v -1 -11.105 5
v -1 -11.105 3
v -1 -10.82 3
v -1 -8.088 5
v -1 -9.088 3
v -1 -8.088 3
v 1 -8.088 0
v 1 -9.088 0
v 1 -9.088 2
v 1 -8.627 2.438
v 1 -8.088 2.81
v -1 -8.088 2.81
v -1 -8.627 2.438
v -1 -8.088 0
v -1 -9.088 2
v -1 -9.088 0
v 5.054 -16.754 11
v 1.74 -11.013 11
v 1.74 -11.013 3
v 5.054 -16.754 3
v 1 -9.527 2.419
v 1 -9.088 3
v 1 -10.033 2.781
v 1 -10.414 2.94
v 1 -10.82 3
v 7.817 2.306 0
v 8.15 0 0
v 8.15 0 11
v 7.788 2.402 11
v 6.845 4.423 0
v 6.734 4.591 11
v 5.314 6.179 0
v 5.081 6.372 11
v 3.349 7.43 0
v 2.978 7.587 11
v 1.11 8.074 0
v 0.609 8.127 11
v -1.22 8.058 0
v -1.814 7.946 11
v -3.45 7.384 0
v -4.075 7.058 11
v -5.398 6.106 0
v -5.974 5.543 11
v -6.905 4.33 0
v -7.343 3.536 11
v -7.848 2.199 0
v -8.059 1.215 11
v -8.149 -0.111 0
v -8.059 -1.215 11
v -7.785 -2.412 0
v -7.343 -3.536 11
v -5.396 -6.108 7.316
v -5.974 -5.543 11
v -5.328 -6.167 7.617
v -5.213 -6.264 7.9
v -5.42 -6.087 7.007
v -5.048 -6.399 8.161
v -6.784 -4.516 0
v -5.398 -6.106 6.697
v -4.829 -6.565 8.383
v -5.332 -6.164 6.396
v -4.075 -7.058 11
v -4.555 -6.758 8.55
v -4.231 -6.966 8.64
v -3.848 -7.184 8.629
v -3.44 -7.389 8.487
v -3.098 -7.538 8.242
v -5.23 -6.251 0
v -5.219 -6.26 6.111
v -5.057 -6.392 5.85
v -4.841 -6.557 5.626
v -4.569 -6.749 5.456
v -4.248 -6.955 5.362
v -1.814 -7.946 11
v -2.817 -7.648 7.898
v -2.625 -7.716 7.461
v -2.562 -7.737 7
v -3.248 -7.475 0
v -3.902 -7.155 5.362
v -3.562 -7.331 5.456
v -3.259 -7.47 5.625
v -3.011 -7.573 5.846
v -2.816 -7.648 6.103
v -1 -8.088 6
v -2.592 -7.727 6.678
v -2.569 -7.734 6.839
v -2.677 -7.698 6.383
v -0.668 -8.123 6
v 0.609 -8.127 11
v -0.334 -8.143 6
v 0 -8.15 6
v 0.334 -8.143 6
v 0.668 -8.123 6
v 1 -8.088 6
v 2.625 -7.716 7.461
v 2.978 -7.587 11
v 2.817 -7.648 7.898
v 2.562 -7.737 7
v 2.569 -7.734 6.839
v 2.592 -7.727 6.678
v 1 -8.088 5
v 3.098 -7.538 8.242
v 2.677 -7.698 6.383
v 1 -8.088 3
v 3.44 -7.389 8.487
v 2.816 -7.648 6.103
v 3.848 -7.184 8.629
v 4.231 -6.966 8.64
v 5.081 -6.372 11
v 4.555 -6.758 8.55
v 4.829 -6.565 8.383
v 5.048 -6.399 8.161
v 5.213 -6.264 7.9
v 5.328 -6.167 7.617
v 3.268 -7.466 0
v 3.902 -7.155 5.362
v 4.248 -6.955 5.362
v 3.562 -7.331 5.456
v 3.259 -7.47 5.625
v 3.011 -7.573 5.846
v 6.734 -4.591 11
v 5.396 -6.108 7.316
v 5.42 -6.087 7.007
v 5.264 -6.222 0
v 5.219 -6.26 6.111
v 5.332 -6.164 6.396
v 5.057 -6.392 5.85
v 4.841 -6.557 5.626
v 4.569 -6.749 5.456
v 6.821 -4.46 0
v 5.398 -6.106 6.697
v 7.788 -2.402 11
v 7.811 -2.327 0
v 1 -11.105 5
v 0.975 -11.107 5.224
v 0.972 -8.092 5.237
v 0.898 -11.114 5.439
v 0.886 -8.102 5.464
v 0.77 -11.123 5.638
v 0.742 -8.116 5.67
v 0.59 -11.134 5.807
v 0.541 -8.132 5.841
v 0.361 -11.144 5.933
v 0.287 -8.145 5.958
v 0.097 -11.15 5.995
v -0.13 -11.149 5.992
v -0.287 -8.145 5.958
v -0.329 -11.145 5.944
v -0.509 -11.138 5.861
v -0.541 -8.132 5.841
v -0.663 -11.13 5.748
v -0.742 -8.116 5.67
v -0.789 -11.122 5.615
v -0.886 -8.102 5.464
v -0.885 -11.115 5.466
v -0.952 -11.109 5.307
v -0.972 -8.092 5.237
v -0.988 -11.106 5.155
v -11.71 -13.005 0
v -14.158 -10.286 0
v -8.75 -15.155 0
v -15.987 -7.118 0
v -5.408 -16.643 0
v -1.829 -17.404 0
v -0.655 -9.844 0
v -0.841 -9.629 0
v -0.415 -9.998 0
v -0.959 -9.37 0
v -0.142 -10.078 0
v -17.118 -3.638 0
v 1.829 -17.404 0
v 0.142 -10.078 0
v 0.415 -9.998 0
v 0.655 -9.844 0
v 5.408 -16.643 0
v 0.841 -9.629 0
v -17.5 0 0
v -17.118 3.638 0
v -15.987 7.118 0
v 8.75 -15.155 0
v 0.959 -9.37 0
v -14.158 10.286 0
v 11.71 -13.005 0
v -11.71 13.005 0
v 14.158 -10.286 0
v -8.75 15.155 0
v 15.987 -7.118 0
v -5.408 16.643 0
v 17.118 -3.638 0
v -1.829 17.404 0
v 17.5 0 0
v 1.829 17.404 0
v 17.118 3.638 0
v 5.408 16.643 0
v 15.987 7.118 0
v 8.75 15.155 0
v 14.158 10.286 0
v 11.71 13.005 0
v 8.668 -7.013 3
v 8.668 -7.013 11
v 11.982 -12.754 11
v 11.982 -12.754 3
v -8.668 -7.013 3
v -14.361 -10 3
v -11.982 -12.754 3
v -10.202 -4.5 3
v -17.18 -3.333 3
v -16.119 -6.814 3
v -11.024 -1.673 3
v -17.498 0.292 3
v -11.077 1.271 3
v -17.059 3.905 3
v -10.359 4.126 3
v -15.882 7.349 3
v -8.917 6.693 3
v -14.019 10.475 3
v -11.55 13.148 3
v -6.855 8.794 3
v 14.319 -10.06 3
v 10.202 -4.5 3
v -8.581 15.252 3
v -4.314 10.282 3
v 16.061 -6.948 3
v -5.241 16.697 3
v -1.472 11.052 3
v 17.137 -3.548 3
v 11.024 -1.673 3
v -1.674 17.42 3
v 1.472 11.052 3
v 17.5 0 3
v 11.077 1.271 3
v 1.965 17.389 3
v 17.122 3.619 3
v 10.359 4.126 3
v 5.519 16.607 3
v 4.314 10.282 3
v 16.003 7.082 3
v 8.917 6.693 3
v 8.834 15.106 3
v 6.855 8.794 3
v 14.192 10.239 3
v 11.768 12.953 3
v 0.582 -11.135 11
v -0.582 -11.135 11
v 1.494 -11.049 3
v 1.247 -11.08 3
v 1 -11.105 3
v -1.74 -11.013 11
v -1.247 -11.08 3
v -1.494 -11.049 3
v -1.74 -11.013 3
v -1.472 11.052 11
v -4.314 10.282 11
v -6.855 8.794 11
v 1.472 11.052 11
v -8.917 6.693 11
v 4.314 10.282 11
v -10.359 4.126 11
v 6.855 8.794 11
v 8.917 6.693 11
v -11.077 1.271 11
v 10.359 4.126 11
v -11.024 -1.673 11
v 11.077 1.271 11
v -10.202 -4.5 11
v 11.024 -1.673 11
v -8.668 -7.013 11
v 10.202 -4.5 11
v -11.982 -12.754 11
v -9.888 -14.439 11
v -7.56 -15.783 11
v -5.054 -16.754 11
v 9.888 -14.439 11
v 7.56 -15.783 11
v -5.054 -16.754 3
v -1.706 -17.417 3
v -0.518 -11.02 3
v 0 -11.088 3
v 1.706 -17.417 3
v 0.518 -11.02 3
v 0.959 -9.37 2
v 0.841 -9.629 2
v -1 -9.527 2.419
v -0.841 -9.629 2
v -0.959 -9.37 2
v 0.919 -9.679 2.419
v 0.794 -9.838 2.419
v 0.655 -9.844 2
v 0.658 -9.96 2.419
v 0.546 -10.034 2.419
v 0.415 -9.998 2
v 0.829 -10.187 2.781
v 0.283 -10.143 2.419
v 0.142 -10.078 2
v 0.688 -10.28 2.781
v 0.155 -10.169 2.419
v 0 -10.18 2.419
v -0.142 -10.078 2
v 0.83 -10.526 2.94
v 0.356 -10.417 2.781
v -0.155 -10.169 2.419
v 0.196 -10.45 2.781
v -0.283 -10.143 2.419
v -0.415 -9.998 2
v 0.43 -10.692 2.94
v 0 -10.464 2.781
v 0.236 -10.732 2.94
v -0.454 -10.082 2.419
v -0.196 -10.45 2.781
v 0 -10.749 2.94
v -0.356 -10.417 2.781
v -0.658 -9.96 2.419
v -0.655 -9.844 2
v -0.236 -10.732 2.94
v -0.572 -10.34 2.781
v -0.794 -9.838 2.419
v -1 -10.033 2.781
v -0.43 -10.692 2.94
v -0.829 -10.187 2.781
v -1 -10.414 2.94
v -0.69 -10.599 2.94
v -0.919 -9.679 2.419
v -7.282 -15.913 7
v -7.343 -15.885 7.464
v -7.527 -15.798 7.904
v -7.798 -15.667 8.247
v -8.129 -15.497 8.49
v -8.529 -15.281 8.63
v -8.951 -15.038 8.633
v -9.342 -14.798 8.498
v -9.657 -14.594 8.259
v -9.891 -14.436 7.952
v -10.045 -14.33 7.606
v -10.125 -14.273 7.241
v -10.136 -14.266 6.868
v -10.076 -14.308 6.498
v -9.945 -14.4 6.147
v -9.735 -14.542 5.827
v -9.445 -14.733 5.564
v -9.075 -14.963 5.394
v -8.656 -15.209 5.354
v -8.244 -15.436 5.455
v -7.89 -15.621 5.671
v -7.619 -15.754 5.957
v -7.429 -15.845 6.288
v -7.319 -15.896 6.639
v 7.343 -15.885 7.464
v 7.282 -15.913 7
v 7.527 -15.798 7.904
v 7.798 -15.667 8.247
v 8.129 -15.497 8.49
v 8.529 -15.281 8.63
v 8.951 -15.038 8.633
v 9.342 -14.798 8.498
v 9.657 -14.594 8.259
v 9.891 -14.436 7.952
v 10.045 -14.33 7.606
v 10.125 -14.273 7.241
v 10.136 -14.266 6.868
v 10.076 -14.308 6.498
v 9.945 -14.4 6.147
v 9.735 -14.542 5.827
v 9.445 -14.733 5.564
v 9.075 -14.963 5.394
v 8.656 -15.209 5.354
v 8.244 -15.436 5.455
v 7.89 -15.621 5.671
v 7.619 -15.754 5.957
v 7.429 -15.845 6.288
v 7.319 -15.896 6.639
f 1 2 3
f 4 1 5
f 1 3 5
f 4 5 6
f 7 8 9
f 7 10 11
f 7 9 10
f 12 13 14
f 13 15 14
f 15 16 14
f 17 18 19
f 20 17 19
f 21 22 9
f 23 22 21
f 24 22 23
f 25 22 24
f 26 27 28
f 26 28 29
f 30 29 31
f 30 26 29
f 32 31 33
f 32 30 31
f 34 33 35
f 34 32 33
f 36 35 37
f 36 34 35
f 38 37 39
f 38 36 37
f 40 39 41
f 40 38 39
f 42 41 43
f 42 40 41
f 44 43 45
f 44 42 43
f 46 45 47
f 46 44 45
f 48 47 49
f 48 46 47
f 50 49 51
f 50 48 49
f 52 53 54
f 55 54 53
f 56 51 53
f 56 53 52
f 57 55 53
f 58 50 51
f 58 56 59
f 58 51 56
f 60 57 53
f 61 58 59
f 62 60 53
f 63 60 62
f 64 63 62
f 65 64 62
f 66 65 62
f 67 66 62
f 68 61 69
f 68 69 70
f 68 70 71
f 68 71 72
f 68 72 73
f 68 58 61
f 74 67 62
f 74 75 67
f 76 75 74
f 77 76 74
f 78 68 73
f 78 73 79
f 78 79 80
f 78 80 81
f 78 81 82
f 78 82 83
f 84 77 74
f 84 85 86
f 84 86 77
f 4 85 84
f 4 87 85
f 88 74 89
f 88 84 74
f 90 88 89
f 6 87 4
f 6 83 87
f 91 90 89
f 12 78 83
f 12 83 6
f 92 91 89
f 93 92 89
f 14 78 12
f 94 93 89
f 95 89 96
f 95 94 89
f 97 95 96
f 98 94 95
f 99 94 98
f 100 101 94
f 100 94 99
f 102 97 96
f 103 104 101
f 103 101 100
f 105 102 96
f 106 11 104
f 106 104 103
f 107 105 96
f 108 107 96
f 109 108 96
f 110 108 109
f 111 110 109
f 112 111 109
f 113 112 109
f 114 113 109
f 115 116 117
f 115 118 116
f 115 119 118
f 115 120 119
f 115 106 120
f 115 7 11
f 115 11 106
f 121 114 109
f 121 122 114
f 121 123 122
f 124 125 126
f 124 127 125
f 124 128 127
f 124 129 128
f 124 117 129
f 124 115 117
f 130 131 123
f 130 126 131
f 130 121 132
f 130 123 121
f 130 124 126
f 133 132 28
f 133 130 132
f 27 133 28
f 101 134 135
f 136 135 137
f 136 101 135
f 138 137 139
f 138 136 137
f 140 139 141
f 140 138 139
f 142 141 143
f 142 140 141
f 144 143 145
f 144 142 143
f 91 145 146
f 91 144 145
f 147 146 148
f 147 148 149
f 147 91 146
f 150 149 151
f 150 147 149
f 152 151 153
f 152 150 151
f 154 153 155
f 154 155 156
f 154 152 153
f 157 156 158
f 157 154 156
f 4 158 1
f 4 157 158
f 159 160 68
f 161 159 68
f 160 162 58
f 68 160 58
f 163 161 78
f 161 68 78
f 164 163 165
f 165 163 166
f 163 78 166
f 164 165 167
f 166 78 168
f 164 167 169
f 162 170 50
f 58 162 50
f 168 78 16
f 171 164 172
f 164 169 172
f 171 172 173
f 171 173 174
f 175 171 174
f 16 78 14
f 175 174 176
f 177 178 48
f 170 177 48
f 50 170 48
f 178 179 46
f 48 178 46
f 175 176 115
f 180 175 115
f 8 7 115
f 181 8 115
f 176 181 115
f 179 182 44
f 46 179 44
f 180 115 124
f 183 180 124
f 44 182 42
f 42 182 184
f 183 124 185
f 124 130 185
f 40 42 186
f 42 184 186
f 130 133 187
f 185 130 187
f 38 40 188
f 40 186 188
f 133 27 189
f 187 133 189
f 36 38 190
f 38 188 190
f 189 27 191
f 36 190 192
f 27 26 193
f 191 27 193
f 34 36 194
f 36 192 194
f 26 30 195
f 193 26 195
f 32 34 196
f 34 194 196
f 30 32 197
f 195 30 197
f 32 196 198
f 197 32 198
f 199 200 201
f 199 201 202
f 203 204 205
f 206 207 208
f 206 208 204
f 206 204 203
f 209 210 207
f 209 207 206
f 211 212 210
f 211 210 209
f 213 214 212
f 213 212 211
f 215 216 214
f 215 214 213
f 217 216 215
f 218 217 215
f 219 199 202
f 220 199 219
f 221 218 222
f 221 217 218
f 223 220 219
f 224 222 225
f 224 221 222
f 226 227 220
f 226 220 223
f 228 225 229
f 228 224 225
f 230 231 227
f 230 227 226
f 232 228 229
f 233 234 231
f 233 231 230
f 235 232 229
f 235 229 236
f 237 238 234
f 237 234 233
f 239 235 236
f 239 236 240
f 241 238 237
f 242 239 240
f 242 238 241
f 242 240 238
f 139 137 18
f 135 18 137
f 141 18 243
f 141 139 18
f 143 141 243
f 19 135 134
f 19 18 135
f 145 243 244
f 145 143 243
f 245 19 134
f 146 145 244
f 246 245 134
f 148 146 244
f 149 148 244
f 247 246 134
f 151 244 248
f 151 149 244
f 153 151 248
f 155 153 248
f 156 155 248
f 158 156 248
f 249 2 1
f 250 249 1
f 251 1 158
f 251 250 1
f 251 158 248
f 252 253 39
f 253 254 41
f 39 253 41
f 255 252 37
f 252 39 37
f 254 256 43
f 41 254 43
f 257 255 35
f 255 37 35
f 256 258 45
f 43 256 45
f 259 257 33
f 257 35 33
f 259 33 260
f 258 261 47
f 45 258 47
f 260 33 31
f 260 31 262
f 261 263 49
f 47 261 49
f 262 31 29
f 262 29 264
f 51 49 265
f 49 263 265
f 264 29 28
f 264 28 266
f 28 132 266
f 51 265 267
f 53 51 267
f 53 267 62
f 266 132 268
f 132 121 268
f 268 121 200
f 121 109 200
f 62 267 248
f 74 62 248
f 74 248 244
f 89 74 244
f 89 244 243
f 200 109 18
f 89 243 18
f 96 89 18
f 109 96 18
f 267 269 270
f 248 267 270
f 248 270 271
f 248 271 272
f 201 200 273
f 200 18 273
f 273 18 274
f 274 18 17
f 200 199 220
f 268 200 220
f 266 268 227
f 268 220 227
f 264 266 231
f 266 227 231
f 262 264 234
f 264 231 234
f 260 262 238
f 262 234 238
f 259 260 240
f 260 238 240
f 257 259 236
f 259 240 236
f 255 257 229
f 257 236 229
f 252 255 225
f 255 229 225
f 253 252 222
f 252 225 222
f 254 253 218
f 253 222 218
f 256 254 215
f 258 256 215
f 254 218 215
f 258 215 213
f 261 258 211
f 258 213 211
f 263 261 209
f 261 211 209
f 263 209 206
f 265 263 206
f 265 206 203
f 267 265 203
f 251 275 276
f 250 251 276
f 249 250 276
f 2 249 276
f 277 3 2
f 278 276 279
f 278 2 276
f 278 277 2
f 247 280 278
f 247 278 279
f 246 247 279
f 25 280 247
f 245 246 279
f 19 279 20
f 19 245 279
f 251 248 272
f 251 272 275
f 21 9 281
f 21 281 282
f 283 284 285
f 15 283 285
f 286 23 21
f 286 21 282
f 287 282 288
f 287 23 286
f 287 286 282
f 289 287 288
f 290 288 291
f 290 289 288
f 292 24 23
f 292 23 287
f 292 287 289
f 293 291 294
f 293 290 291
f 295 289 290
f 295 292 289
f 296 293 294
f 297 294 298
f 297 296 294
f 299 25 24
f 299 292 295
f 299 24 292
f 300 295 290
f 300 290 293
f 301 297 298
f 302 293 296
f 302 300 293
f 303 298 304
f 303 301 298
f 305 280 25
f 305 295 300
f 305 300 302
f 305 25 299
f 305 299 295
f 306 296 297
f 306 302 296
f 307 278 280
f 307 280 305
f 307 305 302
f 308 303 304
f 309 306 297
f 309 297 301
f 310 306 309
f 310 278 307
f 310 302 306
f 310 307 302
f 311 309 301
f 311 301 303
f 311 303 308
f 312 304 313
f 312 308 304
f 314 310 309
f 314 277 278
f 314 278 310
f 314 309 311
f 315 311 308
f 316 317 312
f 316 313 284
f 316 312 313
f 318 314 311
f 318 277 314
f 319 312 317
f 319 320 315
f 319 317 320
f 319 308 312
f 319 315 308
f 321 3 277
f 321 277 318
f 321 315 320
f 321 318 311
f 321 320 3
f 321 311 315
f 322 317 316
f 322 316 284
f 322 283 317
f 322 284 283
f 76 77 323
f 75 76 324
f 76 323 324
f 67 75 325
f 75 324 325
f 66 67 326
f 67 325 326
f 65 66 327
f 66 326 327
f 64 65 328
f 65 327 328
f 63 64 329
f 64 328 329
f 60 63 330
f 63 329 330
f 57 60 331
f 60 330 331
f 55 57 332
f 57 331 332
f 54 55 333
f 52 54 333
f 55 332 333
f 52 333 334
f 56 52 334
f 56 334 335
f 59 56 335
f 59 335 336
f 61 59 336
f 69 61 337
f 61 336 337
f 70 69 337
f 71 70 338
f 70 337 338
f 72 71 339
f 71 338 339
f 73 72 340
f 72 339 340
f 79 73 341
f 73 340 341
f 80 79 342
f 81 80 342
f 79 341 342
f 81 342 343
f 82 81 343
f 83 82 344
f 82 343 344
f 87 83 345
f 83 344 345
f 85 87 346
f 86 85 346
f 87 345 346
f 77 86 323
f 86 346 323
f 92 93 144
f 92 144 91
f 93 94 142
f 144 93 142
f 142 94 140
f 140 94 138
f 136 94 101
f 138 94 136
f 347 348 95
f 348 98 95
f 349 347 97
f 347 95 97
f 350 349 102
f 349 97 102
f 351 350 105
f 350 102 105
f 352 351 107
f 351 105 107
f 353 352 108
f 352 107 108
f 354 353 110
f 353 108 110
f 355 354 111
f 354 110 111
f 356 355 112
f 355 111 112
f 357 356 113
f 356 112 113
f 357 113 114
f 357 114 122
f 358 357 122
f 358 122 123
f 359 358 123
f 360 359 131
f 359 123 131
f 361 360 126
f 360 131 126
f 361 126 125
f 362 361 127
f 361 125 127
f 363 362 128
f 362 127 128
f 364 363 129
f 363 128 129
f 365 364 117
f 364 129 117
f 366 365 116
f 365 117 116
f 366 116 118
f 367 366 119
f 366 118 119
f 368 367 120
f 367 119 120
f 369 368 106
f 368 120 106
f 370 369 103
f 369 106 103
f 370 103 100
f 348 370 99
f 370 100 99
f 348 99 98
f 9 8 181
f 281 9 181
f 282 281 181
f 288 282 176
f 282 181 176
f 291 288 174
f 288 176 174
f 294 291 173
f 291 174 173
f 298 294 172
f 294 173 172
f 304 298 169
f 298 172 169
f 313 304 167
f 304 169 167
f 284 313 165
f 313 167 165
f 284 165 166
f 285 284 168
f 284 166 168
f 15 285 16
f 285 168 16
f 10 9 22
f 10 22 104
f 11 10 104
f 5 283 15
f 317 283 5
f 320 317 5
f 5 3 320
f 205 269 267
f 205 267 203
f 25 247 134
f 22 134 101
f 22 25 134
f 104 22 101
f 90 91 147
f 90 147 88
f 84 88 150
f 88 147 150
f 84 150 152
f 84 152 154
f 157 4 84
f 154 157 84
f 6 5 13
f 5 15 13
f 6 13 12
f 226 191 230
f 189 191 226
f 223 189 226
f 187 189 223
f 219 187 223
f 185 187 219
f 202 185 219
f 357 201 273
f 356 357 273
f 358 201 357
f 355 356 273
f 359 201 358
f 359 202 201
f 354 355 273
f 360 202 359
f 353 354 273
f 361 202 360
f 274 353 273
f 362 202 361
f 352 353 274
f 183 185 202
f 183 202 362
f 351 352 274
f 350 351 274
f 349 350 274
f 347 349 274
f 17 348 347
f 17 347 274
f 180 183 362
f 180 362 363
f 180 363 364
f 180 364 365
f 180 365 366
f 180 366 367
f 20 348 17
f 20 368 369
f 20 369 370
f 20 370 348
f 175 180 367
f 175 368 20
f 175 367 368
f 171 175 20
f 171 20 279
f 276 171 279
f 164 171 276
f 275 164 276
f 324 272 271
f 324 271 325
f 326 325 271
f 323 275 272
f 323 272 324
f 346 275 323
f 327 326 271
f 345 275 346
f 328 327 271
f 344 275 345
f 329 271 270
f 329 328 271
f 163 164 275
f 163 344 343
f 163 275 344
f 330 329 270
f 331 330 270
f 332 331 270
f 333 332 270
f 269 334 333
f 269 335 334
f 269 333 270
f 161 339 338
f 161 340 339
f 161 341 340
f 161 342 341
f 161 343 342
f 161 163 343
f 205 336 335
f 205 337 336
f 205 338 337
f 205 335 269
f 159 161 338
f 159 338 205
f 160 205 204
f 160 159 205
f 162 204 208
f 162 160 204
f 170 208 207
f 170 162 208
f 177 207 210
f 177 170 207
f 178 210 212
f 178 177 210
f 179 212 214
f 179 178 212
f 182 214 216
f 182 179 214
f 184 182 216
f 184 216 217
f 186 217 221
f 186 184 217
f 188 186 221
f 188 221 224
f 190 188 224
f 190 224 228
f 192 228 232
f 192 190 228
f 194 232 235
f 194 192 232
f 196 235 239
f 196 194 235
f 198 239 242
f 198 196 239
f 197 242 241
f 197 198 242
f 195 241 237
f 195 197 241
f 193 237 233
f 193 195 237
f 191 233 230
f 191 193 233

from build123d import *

# Parameters (mm, degrees)
SKETCH1_R                            = 17.5
SKETCH1_R_2                          = 8.15
BOSS_EXTRUDE1_DEPTH                  = 3
SKETCH2_R                            = 11.15
SKETCH2_R_2                          = 8.15
BOSS_EXTRUDE2_DEPTH                  = 8
BOSS_EXTRUDE5_REACH                  = 39.295
BOSS_EXTRUDE5_END_RADIUS             = 17.5
SKETCH4_W                            = 8
SKETCH4_H                            = 8
BOSS_EXTRUDE5_DIRECTION_2_REACH      = 39.295
BOSS_EXTRUDE5_DIRECTION_2_END_RADIUS = 11.15
CUT_EXTRUDE1_REACH                   = 39.295
CUT_EXTRUDE1_END_RADIUS              = 8.15
SKETCH3_R                            = 1.65
CUT_EXTRUDE1_DIRECTION_2_REACH       = 39.295
CUT_EXTRUDE1_DIRECTION_2_END_RADIUS  = 17.5
CUT_EXTRUDE2_DEPTH                   = 3
CUT_EXTRUDE2_DEPTH_BACK              = 27.009613773
SKETCH6_W                            = 2
SKETCH6_H                            = 9.382987565
CUT_EXTRUDE3_DEPTH                   = 3
FILLET2_R                            = 1


with BuildPart() as part:
    # Sketch1 → Boss-Extrude1 (new body)
    with BuildSketch(Plane.XY):
        Circle(SKETCH1_R)
        Circle(SKETCH1_R_2, mode=Mode.SUBTRACT)
    extrude(amount=BOSS_EXTRUDE1_DEPTH)

    # Sketch2 → Boss-Extrude2 (add)
    with BuildSketch(Plane.XY.offset(3)):
        Circle(SKETCH2_R)
        Circle(SKETCH2_R_2, mode=Mode.SUBTRACT)
    extrude(amount=BOSS_EXTRUDE2_DEPTH)

    # Boss-Extrude5: up to this cylinder (the profile starts inside it)
    boss_extrude5_end = Plane(origin=(0, 0, 7), z_dir=(0, 0, -1)) * Cylinder(BOSS_EXTRUDE5_END_RADIUS, 114.59, mode=Mode.PRIVATE)
    # Sketch4 → Boss-Extrude5 (add, up to the surface)
    with BuildSketch(Plane(origin=(-5.575, -9.656183252, 0), x_dir=(0, 0, -1), z_dir=(-0.500000000000001, -0.866025403784438, 0)), mode=Mode.PRIVATE) as boss_extrude5_sk1:
        with Locations((-7, 0)):
            Rectangle(SKETCH4_W, SKETCH4_H)
    boss_extrude5_tool1 = extrude(boss_extrude5_sk1.sketch, amount=BOSS_EXTRUDE5_REACH, mode=Mode.PRIVATE) & boss_extrude5_end
    boss_extrude5 = boss_extrude5_tool1.solids().sort_by_distance((-5.575, -9.656183, 7))[0]
    add(boss_extrude5)

    # Boss-Extrude5 direction 2: up to this cylinder (the profile starts outside it)
    boss_extrude5_direction_2_end = Plane(origin=(0, 0, 7), z_dir=(0, 0, -1)) * Cylinder(BOSS_EXTRUDE5_DIRECTION_2_END_RADIUS, 101.89, mode=Mode.PRIVATE)
    # Sketch4 → Boss-Extrude5 direction 2 (add, up to the surface)
    with BuildSketch(Plane(origin=(-5.575, -9.656183252, 0), x_dir=(0, 0, -1), z_dir=(-0.500000000000001, -0.866025403784438, 0)), mode=Mode.PRIVATE) as boss_extrude5_direction_2_sk1:
        with Locations((-7, 0)):
            Rectangle(SKETCH4_W, SKETCH4_H)
    boss_extrude5_direction_2_tool1 = extrude(boss_extrude5_direction_2_sk1.sketch, amount=-BOSS_EXTRUDE5_DIRECTION_2_REACH, mode=Mode.PRIVATE) - boss_extrude5_direction_2_end
    boss_extrude5_direction_2 = boss_extrude5_direction_2_tool1.solids().sort_by_distance((-5.575, -9.656183, 7))[0] + boss_extrude5_direction_2_tool1.solids().sort_by_distance((-5.575, -9.656183, 7))[1]
    add(boss_extrude5_direction_2)
    boss_extrude5 = boss_extrude5 + boss_extrude5_direction_2  # both directions under the feature's name, for the pattern or mirror that repeats it

    # Cut-Extrude1: up to this cylinder (the profile starts outside it)
    cut_extrude1_end = Plane(origin=(0, 0, 7), z_dir=(0, 0, -1)) * Cylinder(CUT_EXTRUDE1_END_RADIUS, 95.89, mode=Mode.PRIVATE)
    # Sketch3 → Cut-Extrude1 (cut, up to the surface)
    with BuildSketch(Plane(origin=(-5.575, -9.656183252, 0), x_dir=(0, 0, -1), z_dir=(-0.500000000000001, -0.866025403784438, 0)), mode=Mode.PRIVATE) as cut_extrude1_sk1:
        with Locations(Location((-7, 0, 0), (0, 0, 90))):
            Circle(SKETCH3_R)
    cut_extrude1_tool1 = extrude(cut_extrude1_sk1.sketch, amount=-CUT_EXTRUDE1_REACH, mode=Mode.PRIVATE) - cut_extrude1_end
    cut_extrude1 = cut_extrude1_tool1.solids().sort_by_distance((-5.575, -9.656183, 7))[0]
    add(cut_extrude1, mode=Mode.SUBTRACT)

    # Cut-Extrude1 direction 2: up to this cylinder (the profile starts inside it)
    cut_extrude1_direction_2_end = Plane(origin=(0, 0, 7), z_dir=(0, 0, -1)) * Cylinder(CUT_EXTRUDE1_DIRECTION_2_END_RADIUS, 114.59, mode=Mode.PRIVATE)
    # Sketch3 → Cut-Extrude1 direction 2 (cut, up to the surface)
    with BuildSketch(Plane(origin=(-5.575, -9.656183252, 0), x_dir=(0, 0, -1), z_dir=(-0.500000000000001, -0.866025403784438, 0)), mode=Mode.PRIVATE) as cut_extrude1_direction_2_sk1:
        with Locations(Location((-7, 0, 0), (0, 0, 90))):
            Circle(SKETCH3_R)
    cut_extrude1_direction_2_tool1 = extrude(cut_extrude1_direction_2_sk1.sketch, amount=CUT_EXTRUDE1_DIRECTION_2_REACH, mode=Mode.PRIVATE) & cut_extrude1_direction_2_end
    cut_extrude1_direction_2 = cut_extrude1_direction_2_tool1.solids().sort_by_distance((-5.575, -9.656183, 7))[0]
    add(cut_extrude1_direction_2, mode=Mode.SUBTRACT)
    cut_extrude1 = cut_extrude1 + cut_extrude1_direction_2  # both directions under the feature's name, for the pattern or mirror that repeats it

    # Mirror1: Boss-Extrude5, Cut-Extrude1 across plane
    add(boss_extrude5.mirror(Plane(origin=(0, 0, 0), x_dir=(0, 0, 1), z_dir=(1, 0, 0))))
    add(cut_extrude1.mirror(Plane(origin=(0, 0, 0), x_dir=(0, 0, 1), z_dir=(1, 0, 0))), mode=Mode.SUBTRACT)

    # Sketch5 → Cut-Extrude2 (cut, two sides: drawn at the far end of the back side and taken through both)
    with BuildSketch(Plane.XY.offset(3).offset(-CUT_EXTRUDE2_DEPTH_BACK)):
        with BuildLine():
            Line((-1, -9.088417645), (-1, -8.088417645))
            Line((-1, -8.088417645), (1, -8.088417645))
            Line((1, -8.088417645), (1, -9.088417645))
            ThreePointArc((1, -9.088417645), (0, -10.088417645), (-1, -9.088417645))
        make_face()
    extrude(amount=CUT_EXTRUDE2_DEPTH + CUT_EXTRUDE2_DEPTH_BACK, mode=Mode.SUBTRACT)

    # Sketch6 → Cut-Extrude3 (cut)
    with BuildSketch(Plane.XY.offset(3)):
        with Locations((0, -12.779911428)):
            Rectangle(SKETCH6_W, SKETCH6_H)
    extrude(amount=CUT_EXTRUDE3_DEPTH, mode=Mode.SUBTRACT)

    # Fillet2
    # the kernel refuses this fillet: 1 mm, written as the material it adds along each edge
    with BuildSketch(Plane(origin=(1, -9.088417645, 6), x_dir=(0, 0, -1), z_dir=(0, -1, 0))) as fillet2_piece_1_section:
        with BuildLine():
            CenterArc((FILLET2_R, -FILLET2_R), FILLET2_R, 90, 90)
            Line((0, -FILLET2_R), (0, 0))
            Line((0, 0), (FILLET2_R, 0))
        make_face()
    fillet2_piece_1 = extrude(amount=4.516648766, mode=Mode.PRIVATE)
    fillet2_piece_1 = fillet2_piece_1 & Plane(origin=(0, 0, 5.777290132), x_dir=(1, 0, 0), z_dir=(0, 0, -1)) * Cylinder(11.15, 14, mode=Mode.PRIVATE)
    add(fillet2_piece_1)
    with BuildSketch(Plane(origin=(-1, -13.605066411, 6), x_dir=(1, 0, 0), z_dir=(0, 1, 0))) as fillet2_piece_2_section:
        with BuildLine():
            CenterArc((FILLET2_R, FILLET2_R), FILLET2_R, 180, 90)
            Line((0, FILLET2_R), (0, 0))
            Line((0, 0), (FILLET2_R, 0))
        make_face()
    fillet2_piece_2 = extrude(amount=4.516648766, mode=Mode.PRIVATE)
    fillet2_piece_2 = fillet2_piece_2 & Plane(origin=(0, 0, 5.777290055), x_dir=(1, 0, 0), z_dir=(0, 0, -1)) * Cylinder(11.15, 14, mode=Mode.PRIVATE)
    add(fillet2_piece_2)
    with BuildSketch(Plane(origin=(-1, -9.088417645, 6), x_dir=(1, 0, 0), z_dir=(0, 1, 0))) as fillet2_piece_3_section:
        with BuildLine():
            CenterArc((FILLET2_R, FILLET2_R), FILLET2_R, 180, 90)
            Line((0, FILLET2_R), (0, 0))
            Line((0, 0), (FILLET2_R, 0))
        make_face()
    fillet2_piece_3 = extrude(amount=3.5, mode=Mode.PRIVATE)
    fillet2_piece_3 = fillet2_piece_3 - Plane(origin=(0, 0, 5.774756303), x_dir=(1, 0, 0), z_dir=(0, 0, -1)) * Cylinder(8.15, 12, mode=Mode.PRIVATE)
    add(fillet2_piece_3)
    with BuildSketch(Plane(origin=(1, -5.588417645, 6), x_dir=(0, 0, -1), z_dir=(0, -1, 0))) as fillet2_piece_4_section:
        with BuildLine():
            CenterArc((FILLET2_R, -FILLET2_R), FILLET2_R, 90, 90)
            Line((0, -FILLET2_R), (0, 0))
            Line((0, 0), (FILLET2_R, 0))
        make_face()
    fillet2_piece_4 = extrude(amount=3.5, mode=Mode.PRIVATE)
    fillet2_piece_4 = fillet2_piece_4 - Plane(origin=(0, 0, 5.77475637), x_dir=(1, 0, 0), z_dir=(0, 0, -1)) * Cylinder(8.15, 12, mode=Mode.PRIVATE)
    add(fillet2_piece_4)
    # the kernel refuses this fillet: 1 mm, written as the material it takes off along each edge
    with BuildSketch(Plane(origin=(0, -9.088417645, 3), x_dir=(0.003141587485879873, 0.9999950652018583, 0), z_dir=(-0.9999950652018583, 0.003141587485879873, 0))) as fillet2_2_piece_1_section:
        with BuildLine():
            CenterArc((1 + FILLET2_R, FILLET2_R), FILLET2_R, 180, 90)
            Line((1 + FILLET2_R, 0), (1, 0))
            Line((1, 0), (1, FILLET2_R))
        make_face()
    fillet2_2_piece_1 = revolve(axis=Axis((0, -9.088417645, 3), (0, 0, -1)), revolution_arc=359.64, mode=Mode.PRIVATE)
    fillet2_2_piece_1 = split(fillet2_2_piece_1, bisect_by=Plane(origin=(1, -10.091717807, 2.766201228), z_dir=(-1, 0, 0)), keep=Keep.TOP, mode=Mode.PRIVATE)
    fillet2_2_piece_1 = split(fillet2_2_piece_1, bisect_by=Plane(origin=(-1, -10.091717807, 2.766201228), z_dir=(1, 0, 0)), keep=Keep.TOP, mode=Mode.PRIVATE)
    add(fillet2_2_piece_1, mode=Mode.SUBTRACT)


solid = part.part
